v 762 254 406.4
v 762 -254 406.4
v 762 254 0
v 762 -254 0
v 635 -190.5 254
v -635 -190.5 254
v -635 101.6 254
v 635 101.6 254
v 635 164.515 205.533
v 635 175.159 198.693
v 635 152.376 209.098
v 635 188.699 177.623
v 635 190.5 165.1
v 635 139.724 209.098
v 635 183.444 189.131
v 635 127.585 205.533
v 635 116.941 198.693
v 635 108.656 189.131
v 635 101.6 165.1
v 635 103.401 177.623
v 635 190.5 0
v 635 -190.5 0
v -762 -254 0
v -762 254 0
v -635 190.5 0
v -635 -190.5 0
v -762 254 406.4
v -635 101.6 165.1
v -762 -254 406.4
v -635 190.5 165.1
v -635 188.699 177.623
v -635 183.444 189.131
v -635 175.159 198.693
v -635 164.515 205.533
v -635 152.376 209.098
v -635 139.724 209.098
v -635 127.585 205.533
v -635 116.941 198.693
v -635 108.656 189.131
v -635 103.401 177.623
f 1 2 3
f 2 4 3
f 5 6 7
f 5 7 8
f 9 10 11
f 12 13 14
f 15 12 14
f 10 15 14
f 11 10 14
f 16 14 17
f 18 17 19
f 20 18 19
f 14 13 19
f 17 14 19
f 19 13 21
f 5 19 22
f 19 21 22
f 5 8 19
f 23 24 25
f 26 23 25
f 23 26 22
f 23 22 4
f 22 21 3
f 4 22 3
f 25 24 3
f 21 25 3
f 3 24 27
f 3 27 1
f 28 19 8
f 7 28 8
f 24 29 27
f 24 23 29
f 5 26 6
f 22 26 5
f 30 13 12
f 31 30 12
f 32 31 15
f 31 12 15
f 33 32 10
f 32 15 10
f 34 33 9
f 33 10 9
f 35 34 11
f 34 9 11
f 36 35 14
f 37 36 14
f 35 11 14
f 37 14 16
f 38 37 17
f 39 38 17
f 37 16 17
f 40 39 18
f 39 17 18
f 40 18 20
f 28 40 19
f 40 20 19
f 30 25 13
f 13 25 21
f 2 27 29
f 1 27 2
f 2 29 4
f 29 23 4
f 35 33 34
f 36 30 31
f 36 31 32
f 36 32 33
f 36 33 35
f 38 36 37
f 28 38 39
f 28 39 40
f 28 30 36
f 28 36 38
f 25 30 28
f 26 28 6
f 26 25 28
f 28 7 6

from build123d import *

# Parameters (mm, degrees)
F0_W     = 1524
F0_H     = 508
F1_DEPTH = 381
F2_W     = 1270
F2_H     = 381
F3_DEPTH = 254
F5_DEPTH = 1270
F6_W     = 1524
F6_H     = 508
F7_DEPTH = 25.4


with BuildPart() as f1:
    # F0 (on Top) → F1 (new body)
    with BuildSketch(Plane.XY):
        Rectangle(F0_W, F0_H)
    extrude(amount=F1_DEPTH)

    # F2 (on face) → F3 (cut)
    with BuildSketch(Plane(origin=(0, 0, 0), x_dir=(1, 0, 0), z_dir=(0, 0, -1))):
        Rectangle(F2_W, F2_H)
    extrude(amount=-F3_DEPTH, mode=Mode.SUBTRACT)

    # F4 (on face) → F5 (join, through all)
    with BuildSketch(Plane(origin=(635, 0, 0), x_dir=(0, -1, 0), z_dir=(-1, 0, 0))):
        with BuildLine():
            Line((-101.6, 254), (-190.5, 254))
            Line((-190.5, 254), (-190.5, 165.1))
            ThreePointArc((-190.5, 165.1), (-146.05, 209.55), (-101.6, 165.1))
            Line((-101.6, 165.1), (-101.6, 254))
        make_face()
    extrude(amount=F5_DEPTH)

    # F6 (on face) → F7 (join)
    with BuildSketch(Plane.XY.offset(381)):
        Rectangle(F6_W, F6_H)
    extrude(amount=F7_DEPTH)


solid = f1.part
